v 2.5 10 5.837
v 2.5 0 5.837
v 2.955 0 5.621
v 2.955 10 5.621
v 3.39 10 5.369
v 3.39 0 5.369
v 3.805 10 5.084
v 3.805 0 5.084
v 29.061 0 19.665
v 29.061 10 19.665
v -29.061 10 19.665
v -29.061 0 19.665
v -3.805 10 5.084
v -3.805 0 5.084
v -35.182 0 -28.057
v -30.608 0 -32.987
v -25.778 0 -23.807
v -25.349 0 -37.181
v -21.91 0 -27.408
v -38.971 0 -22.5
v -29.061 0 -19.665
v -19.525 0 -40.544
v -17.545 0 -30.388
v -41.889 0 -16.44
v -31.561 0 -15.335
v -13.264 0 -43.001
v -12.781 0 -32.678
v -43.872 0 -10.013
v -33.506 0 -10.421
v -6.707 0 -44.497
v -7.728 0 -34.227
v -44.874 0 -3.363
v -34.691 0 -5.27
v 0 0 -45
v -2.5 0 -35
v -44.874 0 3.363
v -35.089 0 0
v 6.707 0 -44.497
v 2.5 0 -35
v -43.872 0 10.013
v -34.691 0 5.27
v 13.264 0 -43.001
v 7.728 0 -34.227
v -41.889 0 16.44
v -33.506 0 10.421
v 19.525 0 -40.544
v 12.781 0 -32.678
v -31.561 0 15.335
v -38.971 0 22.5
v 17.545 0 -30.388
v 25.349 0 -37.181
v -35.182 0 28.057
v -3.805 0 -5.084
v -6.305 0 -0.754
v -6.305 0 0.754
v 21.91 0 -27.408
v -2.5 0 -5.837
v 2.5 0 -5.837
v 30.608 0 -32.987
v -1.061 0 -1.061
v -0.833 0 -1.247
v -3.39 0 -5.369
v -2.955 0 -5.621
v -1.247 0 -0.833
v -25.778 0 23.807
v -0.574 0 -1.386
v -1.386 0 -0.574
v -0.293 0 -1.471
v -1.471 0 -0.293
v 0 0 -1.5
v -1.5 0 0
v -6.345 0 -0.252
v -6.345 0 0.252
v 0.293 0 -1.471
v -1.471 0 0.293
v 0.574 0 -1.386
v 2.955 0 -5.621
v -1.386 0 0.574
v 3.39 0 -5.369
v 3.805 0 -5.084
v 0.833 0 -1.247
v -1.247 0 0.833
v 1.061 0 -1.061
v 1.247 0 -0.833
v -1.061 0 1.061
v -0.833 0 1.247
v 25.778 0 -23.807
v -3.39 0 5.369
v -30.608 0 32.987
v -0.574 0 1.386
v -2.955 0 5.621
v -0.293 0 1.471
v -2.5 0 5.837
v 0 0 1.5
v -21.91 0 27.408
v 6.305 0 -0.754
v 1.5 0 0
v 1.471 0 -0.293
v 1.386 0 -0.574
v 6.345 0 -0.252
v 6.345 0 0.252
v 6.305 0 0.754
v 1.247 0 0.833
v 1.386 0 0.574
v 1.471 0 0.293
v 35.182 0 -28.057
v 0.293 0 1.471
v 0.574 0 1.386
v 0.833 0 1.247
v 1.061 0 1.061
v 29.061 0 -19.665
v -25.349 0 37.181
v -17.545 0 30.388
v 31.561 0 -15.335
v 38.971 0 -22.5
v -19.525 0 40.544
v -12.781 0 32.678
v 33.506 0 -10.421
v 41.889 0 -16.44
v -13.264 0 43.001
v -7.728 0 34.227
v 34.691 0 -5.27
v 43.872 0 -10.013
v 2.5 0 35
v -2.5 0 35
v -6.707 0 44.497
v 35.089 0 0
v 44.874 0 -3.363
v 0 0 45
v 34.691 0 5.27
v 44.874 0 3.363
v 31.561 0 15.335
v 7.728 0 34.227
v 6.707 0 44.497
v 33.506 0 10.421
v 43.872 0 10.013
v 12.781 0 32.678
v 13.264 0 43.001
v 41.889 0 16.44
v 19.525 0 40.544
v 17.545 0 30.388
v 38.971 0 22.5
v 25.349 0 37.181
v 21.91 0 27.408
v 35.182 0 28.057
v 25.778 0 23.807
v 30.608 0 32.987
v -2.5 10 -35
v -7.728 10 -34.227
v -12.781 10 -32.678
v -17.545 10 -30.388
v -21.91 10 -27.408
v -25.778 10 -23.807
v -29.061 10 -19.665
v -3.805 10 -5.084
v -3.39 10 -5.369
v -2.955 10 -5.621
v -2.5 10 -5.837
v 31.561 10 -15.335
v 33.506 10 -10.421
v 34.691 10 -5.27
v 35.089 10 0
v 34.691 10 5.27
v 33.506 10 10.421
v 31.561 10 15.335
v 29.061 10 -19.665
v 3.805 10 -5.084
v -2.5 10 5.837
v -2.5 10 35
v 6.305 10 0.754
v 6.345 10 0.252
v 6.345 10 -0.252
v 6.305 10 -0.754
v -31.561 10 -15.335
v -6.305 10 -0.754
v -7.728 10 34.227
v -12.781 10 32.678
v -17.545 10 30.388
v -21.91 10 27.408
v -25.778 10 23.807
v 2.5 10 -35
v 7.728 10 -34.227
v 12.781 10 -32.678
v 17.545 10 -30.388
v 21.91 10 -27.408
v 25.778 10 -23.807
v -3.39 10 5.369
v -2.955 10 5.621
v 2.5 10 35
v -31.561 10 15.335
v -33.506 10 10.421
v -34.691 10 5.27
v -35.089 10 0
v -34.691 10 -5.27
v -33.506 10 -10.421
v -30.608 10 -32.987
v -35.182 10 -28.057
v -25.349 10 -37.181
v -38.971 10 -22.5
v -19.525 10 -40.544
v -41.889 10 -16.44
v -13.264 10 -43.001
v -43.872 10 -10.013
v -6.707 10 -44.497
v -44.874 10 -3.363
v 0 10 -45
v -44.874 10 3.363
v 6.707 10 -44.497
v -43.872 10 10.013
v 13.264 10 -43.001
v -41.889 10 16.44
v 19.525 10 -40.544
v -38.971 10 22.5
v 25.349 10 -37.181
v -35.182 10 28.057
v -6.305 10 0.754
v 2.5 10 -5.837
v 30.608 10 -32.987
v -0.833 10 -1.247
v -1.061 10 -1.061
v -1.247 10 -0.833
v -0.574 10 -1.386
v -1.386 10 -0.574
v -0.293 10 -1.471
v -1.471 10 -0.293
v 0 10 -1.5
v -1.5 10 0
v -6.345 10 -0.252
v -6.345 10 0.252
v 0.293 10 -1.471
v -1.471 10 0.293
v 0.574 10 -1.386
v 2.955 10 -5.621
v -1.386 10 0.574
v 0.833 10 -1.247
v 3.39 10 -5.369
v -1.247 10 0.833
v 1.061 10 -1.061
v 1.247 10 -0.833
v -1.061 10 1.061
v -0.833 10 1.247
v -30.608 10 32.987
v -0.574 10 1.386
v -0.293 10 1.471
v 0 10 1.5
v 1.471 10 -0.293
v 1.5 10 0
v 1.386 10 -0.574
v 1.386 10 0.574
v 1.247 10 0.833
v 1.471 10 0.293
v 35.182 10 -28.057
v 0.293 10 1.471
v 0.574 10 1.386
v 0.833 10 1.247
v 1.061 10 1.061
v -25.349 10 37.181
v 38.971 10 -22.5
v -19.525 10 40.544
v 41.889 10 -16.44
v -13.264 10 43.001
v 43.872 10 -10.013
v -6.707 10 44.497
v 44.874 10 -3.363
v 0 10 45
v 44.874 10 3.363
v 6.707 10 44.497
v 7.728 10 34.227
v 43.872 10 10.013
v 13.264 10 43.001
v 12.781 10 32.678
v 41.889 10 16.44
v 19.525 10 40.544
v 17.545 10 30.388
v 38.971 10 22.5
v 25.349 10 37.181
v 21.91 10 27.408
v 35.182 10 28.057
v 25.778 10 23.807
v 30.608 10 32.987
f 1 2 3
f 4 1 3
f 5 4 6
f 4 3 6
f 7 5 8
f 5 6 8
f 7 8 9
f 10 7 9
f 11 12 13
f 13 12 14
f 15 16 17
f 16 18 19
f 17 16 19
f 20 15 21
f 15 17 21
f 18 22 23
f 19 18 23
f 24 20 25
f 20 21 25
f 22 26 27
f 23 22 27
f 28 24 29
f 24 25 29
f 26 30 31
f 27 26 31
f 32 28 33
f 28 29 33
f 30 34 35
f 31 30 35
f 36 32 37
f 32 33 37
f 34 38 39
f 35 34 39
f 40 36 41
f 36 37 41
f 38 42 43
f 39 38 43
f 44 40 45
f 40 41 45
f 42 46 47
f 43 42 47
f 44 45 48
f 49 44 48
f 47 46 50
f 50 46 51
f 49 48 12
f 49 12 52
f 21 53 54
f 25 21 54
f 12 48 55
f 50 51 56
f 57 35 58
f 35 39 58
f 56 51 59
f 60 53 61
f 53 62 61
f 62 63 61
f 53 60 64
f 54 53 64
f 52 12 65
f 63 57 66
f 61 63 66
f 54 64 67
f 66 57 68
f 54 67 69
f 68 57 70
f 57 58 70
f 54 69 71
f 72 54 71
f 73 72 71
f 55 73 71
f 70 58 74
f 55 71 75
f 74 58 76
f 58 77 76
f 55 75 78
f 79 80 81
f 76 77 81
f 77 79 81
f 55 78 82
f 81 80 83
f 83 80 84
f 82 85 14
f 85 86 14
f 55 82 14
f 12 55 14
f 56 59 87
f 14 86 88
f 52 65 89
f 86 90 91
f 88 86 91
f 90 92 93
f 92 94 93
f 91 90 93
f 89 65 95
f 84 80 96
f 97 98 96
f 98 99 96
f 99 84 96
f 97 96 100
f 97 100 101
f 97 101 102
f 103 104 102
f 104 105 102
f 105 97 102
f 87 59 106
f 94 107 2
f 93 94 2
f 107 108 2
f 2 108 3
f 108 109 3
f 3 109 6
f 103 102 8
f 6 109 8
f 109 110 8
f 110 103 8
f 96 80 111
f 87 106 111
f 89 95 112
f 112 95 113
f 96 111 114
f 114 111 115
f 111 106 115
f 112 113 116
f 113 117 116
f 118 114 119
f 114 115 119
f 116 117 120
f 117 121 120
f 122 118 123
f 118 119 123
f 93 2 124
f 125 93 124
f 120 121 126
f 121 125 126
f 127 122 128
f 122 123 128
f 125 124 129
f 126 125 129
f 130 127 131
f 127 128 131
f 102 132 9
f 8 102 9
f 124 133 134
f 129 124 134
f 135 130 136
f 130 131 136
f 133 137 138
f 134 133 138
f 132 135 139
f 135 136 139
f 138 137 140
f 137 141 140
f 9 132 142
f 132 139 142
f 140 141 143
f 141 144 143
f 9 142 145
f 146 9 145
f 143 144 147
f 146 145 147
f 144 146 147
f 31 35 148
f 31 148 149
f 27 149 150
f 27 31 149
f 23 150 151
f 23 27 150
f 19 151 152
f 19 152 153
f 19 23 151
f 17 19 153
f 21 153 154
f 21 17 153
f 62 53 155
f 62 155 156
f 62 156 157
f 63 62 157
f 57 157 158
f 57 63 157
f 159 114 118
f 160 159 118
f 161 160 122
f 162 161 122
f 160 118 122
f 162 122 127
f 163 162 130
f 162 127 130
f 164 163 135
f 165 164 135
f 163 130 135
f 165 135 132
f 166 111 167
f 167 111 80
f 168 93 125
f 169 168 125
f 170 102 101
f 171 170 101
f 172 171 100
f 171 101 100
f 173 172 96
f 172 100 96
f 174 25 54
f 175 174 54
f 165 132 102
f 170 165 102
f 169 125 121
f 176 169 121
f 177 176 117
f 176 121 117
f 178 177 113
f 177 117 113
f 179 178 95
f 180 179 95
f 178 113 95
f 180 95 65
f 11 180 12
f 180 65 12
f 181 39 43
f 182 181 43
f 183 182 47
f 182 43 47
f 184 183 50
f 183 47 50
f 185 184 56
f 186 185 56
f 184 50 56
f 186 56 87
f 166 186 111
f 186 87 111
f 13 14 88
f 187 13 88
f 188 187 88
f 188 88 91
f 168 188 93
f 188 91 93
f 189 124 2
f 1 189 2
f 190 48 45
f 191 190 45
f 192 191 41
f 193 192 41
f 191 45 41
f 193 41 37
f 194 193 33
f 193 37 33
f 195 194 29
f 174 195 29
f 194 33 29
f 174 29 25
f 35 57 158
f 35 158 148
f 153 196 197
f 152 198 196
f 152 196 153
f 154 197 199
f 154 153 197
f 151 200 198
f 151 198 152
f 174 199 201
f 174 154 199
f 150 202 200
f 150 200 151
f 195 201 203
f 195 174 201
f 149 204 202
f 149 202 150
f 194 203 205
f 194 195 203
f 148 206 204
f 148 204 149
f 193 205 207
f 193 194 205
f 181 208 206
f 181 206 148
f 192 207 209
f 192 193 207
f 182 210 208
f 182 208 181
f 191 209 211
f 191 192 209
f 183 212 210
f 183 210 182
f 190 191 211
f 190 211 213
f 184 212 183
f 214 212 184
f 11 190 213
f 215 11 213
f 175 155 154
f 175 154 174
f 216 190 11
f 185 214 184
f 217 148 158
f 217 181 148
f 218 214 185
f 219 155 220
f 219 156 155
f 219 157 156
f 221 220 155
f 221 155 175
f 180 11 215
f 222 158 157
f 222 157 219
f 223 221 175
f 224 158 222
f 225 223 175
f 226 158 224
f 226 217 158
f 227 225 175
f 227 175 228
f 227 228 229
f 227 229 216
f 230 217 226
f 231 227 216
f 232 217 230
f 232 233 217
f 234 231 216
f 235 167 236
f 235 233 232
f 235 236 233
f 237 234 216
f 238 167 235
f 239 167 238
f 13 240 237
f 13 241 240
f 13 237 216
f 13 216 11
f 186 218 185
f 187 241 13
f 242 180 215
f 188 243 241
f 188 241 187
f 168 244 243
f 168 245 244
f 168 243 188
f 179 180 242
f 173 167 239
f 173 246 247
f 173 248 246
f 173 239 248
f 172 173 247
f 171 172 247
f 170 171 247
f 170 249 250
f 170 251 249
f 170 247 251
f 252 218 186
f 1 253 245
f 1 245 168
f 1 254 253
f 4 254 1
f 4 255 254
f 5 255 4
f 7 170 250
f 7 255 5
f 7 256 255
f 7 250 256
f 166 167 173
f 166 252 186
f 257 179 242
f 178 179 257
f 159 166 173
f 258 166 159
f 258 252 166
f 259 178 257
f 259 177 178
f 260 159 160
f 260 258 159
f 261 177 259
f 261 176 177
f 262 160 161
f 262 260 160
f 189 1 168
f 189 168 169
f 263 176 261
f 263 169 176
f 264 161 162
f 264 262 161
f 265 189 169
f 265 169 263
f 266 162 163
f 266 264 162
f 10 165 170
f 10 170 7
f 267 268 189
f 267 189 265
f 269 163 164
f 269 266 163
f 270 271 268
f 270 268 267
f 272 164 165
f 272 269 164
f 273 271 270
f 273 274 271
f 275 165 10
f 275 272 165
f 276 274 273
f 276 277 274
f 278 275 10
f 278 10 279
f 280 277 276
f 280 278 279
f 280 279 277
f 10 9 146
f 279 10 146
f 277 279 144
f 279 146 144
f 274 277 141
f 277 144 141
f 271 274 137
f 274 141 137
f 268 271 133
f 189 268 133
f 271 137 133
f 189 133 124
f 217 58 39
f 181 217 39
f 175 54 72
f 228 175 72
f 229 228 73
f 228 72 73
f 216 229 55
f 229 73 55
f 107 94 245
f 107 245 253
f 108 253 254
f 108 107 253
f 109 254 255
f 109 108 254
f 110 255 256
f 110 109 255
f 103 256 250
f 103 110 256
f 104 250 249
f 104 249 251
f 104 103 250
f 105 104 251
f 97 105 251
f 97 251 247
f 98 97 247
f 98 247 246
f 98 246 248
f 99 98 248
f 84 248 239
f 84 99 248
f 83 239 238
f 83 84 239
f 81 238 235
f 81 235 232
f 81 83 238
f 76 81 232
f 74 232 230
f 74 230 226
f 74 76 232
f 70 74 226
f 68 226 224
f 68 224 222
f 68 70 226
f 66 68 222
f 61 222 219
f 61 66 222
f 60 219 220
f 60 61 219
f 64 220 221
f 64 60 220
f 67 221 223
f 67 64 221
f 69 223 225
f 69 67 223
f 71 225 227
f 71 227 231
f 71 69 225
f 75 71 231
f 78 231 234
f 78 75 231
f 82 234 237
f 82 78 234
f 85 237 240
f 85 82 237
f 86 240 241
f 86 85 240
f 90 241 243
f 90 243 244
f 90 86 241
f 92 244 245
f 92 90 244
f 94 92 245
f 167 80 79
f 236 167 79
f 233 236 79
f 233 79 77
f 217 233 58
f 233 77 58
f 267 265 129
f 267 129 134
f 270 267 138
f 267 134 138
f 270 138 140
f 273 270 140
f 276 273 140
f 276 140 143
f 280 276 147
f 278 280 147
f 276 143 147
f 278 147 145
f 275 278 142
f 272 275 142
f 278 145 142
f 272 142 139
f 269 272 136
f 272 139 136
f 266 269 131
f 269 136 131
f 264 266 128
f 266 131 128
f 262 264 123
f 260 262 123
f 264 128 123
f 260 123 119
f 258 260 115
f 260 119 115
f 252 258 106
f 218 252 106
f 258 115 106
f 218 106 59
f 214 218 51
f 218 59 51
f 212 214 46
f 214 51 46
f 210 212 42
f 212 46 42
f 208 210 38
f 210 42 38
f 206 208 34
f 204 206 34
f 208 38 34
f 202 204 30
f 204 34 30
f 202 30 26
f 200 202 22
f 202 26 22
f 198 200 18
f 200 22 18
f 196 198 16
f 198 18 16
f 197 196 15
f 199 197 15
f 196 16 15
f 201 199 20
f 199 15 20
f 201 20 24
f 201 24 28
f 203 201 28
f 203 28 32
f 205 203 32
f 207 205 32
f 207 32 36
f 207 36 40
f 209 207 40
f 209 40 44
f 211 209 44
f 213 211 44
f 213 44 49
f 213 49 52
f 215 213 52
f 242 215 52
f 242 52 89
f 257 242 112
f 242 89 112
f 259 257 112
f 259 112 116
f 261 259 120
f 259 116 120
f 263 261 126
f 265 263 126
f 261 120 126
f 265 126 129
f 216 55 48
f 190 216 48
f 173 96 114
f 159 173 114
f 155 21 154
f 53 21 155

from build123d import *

# Parameters (mm, degrees)
SKETCH1_R           = 45
SKETCH1_R_2         = 1.5
BOSS_EXTRUDE1_DEPTH = 10


with BuildPart() as part:
    # Sketch1 → Boss-Extrude1 (new body)
    with BuildSketch(Plane(origin=(0, 0, 0), x_dir=(1, 0, 0), z_dir=(0, 1, 0))):
        with Locations(Location((0, 0, 0), (0, 0, 270))):
            Circle(SKETCH1_R)
        with Locations(Location((0, 0, 0), (0, 0, 270))):
            Circle(SKETCH1_R_2, mode=Mode.SUBTRACT)
        with BuildLine():
            Line((-2.5, 5.837165408), (-2.5, 35))
            ThreePointArc((-2.5, 35), (-17.54458606, 30.388114453), (-29.060889132, 19.665063509))
            Line((-29.060889132, 19.665063509), (-3.805133529, 5.083646213))
            ThreePointArc((-3.805133529, 5.083646213), (-3.175, 5.499261314), (-2.5, 5.837165408))
        make_face(mode=Mode.SUBTRACT)
        with BuildLine():
            Line((2.5, 5.837165408), (2.5, 35))
            ThreePointArc((2.5, 35), (17.54458606, 30.388114453), (29.060889132, 19.665063509))
            Line((29.060889132, 19.665063509), (3.805133529, 5.083646213))
            ThreePointArc((3.805133529, 5.083646213), (3.175, 5.499261314), (2.5, 5.837165408))
        make_face(mode=Mode.SUBTRACT)
        with BuildLine():
            Line((6.305133529, 0.753519195), (31.560889132, 15.334936491))
            ThreePointArc((31.560889132, 15.334936491), (35.089172119, 0), (31.560889132, -15.334936491))
            Line((31.560889132, -15.334936491), (6.305133529, -0.753519195))
            ThreePointArc((6.305133529, -0.753519195), (6.35, 0), (6.305133529, 0.753519195))
        make_face(mode=Mode.SUBTRACT)
        with BuildLine():
            Line((3.805133529, -5.083646213), (29.060889132, -19.665063509))
            ThreePointArc((29.060889132, -19.665063509), (17.54458606, -30.388114453), (2.5, -35))
            Line((2.5, -35), (2.5, -5.837165408))
            ThreePointArc((2.5, -5.837165408), (3.175, -5.499261314), (3.805133529, -5.083646213))
        make_face(mode=Mode.SUBTRACT)
        with BuildLine():
            Line((-2.5, -5.837165408), (-2.5, -35))
            ThreePointArc((-2.5, -35), (-17.54458606, -30.388114453), (-29.060889132, -19.665063509))
            Line((-29.060889132, -19.665063509), (-3.805133529, -5.083646213))
            ThreePointArc((-3.805133529, -5.083646213), (-3.175, -5.499261314), (-2.5, -5.837165408))
        make_face(mode=Mode.SUBTRACT)
        with BuildLine():
            Line((-6.305133529, -0.753519195), (-31.560889132, -15.334936491))
            ThreePointArc((-31.560889132, -15.334936491), (-35.089172119, 0), (-31.560889132, 15.334936491))
            Line((-31.560889132, 15.334936491), (-6.305133529, 0.753519195))
            ThreePointArc((-6.305133529, 0.753519195), (-6.35, 0), (-6.305133529, -0.753519195))
        make_face(mode=Mode.SUBTRACT)
    extrude(amount=BOSS_EXTRUDE1_DEPTH)


solid = part.part
